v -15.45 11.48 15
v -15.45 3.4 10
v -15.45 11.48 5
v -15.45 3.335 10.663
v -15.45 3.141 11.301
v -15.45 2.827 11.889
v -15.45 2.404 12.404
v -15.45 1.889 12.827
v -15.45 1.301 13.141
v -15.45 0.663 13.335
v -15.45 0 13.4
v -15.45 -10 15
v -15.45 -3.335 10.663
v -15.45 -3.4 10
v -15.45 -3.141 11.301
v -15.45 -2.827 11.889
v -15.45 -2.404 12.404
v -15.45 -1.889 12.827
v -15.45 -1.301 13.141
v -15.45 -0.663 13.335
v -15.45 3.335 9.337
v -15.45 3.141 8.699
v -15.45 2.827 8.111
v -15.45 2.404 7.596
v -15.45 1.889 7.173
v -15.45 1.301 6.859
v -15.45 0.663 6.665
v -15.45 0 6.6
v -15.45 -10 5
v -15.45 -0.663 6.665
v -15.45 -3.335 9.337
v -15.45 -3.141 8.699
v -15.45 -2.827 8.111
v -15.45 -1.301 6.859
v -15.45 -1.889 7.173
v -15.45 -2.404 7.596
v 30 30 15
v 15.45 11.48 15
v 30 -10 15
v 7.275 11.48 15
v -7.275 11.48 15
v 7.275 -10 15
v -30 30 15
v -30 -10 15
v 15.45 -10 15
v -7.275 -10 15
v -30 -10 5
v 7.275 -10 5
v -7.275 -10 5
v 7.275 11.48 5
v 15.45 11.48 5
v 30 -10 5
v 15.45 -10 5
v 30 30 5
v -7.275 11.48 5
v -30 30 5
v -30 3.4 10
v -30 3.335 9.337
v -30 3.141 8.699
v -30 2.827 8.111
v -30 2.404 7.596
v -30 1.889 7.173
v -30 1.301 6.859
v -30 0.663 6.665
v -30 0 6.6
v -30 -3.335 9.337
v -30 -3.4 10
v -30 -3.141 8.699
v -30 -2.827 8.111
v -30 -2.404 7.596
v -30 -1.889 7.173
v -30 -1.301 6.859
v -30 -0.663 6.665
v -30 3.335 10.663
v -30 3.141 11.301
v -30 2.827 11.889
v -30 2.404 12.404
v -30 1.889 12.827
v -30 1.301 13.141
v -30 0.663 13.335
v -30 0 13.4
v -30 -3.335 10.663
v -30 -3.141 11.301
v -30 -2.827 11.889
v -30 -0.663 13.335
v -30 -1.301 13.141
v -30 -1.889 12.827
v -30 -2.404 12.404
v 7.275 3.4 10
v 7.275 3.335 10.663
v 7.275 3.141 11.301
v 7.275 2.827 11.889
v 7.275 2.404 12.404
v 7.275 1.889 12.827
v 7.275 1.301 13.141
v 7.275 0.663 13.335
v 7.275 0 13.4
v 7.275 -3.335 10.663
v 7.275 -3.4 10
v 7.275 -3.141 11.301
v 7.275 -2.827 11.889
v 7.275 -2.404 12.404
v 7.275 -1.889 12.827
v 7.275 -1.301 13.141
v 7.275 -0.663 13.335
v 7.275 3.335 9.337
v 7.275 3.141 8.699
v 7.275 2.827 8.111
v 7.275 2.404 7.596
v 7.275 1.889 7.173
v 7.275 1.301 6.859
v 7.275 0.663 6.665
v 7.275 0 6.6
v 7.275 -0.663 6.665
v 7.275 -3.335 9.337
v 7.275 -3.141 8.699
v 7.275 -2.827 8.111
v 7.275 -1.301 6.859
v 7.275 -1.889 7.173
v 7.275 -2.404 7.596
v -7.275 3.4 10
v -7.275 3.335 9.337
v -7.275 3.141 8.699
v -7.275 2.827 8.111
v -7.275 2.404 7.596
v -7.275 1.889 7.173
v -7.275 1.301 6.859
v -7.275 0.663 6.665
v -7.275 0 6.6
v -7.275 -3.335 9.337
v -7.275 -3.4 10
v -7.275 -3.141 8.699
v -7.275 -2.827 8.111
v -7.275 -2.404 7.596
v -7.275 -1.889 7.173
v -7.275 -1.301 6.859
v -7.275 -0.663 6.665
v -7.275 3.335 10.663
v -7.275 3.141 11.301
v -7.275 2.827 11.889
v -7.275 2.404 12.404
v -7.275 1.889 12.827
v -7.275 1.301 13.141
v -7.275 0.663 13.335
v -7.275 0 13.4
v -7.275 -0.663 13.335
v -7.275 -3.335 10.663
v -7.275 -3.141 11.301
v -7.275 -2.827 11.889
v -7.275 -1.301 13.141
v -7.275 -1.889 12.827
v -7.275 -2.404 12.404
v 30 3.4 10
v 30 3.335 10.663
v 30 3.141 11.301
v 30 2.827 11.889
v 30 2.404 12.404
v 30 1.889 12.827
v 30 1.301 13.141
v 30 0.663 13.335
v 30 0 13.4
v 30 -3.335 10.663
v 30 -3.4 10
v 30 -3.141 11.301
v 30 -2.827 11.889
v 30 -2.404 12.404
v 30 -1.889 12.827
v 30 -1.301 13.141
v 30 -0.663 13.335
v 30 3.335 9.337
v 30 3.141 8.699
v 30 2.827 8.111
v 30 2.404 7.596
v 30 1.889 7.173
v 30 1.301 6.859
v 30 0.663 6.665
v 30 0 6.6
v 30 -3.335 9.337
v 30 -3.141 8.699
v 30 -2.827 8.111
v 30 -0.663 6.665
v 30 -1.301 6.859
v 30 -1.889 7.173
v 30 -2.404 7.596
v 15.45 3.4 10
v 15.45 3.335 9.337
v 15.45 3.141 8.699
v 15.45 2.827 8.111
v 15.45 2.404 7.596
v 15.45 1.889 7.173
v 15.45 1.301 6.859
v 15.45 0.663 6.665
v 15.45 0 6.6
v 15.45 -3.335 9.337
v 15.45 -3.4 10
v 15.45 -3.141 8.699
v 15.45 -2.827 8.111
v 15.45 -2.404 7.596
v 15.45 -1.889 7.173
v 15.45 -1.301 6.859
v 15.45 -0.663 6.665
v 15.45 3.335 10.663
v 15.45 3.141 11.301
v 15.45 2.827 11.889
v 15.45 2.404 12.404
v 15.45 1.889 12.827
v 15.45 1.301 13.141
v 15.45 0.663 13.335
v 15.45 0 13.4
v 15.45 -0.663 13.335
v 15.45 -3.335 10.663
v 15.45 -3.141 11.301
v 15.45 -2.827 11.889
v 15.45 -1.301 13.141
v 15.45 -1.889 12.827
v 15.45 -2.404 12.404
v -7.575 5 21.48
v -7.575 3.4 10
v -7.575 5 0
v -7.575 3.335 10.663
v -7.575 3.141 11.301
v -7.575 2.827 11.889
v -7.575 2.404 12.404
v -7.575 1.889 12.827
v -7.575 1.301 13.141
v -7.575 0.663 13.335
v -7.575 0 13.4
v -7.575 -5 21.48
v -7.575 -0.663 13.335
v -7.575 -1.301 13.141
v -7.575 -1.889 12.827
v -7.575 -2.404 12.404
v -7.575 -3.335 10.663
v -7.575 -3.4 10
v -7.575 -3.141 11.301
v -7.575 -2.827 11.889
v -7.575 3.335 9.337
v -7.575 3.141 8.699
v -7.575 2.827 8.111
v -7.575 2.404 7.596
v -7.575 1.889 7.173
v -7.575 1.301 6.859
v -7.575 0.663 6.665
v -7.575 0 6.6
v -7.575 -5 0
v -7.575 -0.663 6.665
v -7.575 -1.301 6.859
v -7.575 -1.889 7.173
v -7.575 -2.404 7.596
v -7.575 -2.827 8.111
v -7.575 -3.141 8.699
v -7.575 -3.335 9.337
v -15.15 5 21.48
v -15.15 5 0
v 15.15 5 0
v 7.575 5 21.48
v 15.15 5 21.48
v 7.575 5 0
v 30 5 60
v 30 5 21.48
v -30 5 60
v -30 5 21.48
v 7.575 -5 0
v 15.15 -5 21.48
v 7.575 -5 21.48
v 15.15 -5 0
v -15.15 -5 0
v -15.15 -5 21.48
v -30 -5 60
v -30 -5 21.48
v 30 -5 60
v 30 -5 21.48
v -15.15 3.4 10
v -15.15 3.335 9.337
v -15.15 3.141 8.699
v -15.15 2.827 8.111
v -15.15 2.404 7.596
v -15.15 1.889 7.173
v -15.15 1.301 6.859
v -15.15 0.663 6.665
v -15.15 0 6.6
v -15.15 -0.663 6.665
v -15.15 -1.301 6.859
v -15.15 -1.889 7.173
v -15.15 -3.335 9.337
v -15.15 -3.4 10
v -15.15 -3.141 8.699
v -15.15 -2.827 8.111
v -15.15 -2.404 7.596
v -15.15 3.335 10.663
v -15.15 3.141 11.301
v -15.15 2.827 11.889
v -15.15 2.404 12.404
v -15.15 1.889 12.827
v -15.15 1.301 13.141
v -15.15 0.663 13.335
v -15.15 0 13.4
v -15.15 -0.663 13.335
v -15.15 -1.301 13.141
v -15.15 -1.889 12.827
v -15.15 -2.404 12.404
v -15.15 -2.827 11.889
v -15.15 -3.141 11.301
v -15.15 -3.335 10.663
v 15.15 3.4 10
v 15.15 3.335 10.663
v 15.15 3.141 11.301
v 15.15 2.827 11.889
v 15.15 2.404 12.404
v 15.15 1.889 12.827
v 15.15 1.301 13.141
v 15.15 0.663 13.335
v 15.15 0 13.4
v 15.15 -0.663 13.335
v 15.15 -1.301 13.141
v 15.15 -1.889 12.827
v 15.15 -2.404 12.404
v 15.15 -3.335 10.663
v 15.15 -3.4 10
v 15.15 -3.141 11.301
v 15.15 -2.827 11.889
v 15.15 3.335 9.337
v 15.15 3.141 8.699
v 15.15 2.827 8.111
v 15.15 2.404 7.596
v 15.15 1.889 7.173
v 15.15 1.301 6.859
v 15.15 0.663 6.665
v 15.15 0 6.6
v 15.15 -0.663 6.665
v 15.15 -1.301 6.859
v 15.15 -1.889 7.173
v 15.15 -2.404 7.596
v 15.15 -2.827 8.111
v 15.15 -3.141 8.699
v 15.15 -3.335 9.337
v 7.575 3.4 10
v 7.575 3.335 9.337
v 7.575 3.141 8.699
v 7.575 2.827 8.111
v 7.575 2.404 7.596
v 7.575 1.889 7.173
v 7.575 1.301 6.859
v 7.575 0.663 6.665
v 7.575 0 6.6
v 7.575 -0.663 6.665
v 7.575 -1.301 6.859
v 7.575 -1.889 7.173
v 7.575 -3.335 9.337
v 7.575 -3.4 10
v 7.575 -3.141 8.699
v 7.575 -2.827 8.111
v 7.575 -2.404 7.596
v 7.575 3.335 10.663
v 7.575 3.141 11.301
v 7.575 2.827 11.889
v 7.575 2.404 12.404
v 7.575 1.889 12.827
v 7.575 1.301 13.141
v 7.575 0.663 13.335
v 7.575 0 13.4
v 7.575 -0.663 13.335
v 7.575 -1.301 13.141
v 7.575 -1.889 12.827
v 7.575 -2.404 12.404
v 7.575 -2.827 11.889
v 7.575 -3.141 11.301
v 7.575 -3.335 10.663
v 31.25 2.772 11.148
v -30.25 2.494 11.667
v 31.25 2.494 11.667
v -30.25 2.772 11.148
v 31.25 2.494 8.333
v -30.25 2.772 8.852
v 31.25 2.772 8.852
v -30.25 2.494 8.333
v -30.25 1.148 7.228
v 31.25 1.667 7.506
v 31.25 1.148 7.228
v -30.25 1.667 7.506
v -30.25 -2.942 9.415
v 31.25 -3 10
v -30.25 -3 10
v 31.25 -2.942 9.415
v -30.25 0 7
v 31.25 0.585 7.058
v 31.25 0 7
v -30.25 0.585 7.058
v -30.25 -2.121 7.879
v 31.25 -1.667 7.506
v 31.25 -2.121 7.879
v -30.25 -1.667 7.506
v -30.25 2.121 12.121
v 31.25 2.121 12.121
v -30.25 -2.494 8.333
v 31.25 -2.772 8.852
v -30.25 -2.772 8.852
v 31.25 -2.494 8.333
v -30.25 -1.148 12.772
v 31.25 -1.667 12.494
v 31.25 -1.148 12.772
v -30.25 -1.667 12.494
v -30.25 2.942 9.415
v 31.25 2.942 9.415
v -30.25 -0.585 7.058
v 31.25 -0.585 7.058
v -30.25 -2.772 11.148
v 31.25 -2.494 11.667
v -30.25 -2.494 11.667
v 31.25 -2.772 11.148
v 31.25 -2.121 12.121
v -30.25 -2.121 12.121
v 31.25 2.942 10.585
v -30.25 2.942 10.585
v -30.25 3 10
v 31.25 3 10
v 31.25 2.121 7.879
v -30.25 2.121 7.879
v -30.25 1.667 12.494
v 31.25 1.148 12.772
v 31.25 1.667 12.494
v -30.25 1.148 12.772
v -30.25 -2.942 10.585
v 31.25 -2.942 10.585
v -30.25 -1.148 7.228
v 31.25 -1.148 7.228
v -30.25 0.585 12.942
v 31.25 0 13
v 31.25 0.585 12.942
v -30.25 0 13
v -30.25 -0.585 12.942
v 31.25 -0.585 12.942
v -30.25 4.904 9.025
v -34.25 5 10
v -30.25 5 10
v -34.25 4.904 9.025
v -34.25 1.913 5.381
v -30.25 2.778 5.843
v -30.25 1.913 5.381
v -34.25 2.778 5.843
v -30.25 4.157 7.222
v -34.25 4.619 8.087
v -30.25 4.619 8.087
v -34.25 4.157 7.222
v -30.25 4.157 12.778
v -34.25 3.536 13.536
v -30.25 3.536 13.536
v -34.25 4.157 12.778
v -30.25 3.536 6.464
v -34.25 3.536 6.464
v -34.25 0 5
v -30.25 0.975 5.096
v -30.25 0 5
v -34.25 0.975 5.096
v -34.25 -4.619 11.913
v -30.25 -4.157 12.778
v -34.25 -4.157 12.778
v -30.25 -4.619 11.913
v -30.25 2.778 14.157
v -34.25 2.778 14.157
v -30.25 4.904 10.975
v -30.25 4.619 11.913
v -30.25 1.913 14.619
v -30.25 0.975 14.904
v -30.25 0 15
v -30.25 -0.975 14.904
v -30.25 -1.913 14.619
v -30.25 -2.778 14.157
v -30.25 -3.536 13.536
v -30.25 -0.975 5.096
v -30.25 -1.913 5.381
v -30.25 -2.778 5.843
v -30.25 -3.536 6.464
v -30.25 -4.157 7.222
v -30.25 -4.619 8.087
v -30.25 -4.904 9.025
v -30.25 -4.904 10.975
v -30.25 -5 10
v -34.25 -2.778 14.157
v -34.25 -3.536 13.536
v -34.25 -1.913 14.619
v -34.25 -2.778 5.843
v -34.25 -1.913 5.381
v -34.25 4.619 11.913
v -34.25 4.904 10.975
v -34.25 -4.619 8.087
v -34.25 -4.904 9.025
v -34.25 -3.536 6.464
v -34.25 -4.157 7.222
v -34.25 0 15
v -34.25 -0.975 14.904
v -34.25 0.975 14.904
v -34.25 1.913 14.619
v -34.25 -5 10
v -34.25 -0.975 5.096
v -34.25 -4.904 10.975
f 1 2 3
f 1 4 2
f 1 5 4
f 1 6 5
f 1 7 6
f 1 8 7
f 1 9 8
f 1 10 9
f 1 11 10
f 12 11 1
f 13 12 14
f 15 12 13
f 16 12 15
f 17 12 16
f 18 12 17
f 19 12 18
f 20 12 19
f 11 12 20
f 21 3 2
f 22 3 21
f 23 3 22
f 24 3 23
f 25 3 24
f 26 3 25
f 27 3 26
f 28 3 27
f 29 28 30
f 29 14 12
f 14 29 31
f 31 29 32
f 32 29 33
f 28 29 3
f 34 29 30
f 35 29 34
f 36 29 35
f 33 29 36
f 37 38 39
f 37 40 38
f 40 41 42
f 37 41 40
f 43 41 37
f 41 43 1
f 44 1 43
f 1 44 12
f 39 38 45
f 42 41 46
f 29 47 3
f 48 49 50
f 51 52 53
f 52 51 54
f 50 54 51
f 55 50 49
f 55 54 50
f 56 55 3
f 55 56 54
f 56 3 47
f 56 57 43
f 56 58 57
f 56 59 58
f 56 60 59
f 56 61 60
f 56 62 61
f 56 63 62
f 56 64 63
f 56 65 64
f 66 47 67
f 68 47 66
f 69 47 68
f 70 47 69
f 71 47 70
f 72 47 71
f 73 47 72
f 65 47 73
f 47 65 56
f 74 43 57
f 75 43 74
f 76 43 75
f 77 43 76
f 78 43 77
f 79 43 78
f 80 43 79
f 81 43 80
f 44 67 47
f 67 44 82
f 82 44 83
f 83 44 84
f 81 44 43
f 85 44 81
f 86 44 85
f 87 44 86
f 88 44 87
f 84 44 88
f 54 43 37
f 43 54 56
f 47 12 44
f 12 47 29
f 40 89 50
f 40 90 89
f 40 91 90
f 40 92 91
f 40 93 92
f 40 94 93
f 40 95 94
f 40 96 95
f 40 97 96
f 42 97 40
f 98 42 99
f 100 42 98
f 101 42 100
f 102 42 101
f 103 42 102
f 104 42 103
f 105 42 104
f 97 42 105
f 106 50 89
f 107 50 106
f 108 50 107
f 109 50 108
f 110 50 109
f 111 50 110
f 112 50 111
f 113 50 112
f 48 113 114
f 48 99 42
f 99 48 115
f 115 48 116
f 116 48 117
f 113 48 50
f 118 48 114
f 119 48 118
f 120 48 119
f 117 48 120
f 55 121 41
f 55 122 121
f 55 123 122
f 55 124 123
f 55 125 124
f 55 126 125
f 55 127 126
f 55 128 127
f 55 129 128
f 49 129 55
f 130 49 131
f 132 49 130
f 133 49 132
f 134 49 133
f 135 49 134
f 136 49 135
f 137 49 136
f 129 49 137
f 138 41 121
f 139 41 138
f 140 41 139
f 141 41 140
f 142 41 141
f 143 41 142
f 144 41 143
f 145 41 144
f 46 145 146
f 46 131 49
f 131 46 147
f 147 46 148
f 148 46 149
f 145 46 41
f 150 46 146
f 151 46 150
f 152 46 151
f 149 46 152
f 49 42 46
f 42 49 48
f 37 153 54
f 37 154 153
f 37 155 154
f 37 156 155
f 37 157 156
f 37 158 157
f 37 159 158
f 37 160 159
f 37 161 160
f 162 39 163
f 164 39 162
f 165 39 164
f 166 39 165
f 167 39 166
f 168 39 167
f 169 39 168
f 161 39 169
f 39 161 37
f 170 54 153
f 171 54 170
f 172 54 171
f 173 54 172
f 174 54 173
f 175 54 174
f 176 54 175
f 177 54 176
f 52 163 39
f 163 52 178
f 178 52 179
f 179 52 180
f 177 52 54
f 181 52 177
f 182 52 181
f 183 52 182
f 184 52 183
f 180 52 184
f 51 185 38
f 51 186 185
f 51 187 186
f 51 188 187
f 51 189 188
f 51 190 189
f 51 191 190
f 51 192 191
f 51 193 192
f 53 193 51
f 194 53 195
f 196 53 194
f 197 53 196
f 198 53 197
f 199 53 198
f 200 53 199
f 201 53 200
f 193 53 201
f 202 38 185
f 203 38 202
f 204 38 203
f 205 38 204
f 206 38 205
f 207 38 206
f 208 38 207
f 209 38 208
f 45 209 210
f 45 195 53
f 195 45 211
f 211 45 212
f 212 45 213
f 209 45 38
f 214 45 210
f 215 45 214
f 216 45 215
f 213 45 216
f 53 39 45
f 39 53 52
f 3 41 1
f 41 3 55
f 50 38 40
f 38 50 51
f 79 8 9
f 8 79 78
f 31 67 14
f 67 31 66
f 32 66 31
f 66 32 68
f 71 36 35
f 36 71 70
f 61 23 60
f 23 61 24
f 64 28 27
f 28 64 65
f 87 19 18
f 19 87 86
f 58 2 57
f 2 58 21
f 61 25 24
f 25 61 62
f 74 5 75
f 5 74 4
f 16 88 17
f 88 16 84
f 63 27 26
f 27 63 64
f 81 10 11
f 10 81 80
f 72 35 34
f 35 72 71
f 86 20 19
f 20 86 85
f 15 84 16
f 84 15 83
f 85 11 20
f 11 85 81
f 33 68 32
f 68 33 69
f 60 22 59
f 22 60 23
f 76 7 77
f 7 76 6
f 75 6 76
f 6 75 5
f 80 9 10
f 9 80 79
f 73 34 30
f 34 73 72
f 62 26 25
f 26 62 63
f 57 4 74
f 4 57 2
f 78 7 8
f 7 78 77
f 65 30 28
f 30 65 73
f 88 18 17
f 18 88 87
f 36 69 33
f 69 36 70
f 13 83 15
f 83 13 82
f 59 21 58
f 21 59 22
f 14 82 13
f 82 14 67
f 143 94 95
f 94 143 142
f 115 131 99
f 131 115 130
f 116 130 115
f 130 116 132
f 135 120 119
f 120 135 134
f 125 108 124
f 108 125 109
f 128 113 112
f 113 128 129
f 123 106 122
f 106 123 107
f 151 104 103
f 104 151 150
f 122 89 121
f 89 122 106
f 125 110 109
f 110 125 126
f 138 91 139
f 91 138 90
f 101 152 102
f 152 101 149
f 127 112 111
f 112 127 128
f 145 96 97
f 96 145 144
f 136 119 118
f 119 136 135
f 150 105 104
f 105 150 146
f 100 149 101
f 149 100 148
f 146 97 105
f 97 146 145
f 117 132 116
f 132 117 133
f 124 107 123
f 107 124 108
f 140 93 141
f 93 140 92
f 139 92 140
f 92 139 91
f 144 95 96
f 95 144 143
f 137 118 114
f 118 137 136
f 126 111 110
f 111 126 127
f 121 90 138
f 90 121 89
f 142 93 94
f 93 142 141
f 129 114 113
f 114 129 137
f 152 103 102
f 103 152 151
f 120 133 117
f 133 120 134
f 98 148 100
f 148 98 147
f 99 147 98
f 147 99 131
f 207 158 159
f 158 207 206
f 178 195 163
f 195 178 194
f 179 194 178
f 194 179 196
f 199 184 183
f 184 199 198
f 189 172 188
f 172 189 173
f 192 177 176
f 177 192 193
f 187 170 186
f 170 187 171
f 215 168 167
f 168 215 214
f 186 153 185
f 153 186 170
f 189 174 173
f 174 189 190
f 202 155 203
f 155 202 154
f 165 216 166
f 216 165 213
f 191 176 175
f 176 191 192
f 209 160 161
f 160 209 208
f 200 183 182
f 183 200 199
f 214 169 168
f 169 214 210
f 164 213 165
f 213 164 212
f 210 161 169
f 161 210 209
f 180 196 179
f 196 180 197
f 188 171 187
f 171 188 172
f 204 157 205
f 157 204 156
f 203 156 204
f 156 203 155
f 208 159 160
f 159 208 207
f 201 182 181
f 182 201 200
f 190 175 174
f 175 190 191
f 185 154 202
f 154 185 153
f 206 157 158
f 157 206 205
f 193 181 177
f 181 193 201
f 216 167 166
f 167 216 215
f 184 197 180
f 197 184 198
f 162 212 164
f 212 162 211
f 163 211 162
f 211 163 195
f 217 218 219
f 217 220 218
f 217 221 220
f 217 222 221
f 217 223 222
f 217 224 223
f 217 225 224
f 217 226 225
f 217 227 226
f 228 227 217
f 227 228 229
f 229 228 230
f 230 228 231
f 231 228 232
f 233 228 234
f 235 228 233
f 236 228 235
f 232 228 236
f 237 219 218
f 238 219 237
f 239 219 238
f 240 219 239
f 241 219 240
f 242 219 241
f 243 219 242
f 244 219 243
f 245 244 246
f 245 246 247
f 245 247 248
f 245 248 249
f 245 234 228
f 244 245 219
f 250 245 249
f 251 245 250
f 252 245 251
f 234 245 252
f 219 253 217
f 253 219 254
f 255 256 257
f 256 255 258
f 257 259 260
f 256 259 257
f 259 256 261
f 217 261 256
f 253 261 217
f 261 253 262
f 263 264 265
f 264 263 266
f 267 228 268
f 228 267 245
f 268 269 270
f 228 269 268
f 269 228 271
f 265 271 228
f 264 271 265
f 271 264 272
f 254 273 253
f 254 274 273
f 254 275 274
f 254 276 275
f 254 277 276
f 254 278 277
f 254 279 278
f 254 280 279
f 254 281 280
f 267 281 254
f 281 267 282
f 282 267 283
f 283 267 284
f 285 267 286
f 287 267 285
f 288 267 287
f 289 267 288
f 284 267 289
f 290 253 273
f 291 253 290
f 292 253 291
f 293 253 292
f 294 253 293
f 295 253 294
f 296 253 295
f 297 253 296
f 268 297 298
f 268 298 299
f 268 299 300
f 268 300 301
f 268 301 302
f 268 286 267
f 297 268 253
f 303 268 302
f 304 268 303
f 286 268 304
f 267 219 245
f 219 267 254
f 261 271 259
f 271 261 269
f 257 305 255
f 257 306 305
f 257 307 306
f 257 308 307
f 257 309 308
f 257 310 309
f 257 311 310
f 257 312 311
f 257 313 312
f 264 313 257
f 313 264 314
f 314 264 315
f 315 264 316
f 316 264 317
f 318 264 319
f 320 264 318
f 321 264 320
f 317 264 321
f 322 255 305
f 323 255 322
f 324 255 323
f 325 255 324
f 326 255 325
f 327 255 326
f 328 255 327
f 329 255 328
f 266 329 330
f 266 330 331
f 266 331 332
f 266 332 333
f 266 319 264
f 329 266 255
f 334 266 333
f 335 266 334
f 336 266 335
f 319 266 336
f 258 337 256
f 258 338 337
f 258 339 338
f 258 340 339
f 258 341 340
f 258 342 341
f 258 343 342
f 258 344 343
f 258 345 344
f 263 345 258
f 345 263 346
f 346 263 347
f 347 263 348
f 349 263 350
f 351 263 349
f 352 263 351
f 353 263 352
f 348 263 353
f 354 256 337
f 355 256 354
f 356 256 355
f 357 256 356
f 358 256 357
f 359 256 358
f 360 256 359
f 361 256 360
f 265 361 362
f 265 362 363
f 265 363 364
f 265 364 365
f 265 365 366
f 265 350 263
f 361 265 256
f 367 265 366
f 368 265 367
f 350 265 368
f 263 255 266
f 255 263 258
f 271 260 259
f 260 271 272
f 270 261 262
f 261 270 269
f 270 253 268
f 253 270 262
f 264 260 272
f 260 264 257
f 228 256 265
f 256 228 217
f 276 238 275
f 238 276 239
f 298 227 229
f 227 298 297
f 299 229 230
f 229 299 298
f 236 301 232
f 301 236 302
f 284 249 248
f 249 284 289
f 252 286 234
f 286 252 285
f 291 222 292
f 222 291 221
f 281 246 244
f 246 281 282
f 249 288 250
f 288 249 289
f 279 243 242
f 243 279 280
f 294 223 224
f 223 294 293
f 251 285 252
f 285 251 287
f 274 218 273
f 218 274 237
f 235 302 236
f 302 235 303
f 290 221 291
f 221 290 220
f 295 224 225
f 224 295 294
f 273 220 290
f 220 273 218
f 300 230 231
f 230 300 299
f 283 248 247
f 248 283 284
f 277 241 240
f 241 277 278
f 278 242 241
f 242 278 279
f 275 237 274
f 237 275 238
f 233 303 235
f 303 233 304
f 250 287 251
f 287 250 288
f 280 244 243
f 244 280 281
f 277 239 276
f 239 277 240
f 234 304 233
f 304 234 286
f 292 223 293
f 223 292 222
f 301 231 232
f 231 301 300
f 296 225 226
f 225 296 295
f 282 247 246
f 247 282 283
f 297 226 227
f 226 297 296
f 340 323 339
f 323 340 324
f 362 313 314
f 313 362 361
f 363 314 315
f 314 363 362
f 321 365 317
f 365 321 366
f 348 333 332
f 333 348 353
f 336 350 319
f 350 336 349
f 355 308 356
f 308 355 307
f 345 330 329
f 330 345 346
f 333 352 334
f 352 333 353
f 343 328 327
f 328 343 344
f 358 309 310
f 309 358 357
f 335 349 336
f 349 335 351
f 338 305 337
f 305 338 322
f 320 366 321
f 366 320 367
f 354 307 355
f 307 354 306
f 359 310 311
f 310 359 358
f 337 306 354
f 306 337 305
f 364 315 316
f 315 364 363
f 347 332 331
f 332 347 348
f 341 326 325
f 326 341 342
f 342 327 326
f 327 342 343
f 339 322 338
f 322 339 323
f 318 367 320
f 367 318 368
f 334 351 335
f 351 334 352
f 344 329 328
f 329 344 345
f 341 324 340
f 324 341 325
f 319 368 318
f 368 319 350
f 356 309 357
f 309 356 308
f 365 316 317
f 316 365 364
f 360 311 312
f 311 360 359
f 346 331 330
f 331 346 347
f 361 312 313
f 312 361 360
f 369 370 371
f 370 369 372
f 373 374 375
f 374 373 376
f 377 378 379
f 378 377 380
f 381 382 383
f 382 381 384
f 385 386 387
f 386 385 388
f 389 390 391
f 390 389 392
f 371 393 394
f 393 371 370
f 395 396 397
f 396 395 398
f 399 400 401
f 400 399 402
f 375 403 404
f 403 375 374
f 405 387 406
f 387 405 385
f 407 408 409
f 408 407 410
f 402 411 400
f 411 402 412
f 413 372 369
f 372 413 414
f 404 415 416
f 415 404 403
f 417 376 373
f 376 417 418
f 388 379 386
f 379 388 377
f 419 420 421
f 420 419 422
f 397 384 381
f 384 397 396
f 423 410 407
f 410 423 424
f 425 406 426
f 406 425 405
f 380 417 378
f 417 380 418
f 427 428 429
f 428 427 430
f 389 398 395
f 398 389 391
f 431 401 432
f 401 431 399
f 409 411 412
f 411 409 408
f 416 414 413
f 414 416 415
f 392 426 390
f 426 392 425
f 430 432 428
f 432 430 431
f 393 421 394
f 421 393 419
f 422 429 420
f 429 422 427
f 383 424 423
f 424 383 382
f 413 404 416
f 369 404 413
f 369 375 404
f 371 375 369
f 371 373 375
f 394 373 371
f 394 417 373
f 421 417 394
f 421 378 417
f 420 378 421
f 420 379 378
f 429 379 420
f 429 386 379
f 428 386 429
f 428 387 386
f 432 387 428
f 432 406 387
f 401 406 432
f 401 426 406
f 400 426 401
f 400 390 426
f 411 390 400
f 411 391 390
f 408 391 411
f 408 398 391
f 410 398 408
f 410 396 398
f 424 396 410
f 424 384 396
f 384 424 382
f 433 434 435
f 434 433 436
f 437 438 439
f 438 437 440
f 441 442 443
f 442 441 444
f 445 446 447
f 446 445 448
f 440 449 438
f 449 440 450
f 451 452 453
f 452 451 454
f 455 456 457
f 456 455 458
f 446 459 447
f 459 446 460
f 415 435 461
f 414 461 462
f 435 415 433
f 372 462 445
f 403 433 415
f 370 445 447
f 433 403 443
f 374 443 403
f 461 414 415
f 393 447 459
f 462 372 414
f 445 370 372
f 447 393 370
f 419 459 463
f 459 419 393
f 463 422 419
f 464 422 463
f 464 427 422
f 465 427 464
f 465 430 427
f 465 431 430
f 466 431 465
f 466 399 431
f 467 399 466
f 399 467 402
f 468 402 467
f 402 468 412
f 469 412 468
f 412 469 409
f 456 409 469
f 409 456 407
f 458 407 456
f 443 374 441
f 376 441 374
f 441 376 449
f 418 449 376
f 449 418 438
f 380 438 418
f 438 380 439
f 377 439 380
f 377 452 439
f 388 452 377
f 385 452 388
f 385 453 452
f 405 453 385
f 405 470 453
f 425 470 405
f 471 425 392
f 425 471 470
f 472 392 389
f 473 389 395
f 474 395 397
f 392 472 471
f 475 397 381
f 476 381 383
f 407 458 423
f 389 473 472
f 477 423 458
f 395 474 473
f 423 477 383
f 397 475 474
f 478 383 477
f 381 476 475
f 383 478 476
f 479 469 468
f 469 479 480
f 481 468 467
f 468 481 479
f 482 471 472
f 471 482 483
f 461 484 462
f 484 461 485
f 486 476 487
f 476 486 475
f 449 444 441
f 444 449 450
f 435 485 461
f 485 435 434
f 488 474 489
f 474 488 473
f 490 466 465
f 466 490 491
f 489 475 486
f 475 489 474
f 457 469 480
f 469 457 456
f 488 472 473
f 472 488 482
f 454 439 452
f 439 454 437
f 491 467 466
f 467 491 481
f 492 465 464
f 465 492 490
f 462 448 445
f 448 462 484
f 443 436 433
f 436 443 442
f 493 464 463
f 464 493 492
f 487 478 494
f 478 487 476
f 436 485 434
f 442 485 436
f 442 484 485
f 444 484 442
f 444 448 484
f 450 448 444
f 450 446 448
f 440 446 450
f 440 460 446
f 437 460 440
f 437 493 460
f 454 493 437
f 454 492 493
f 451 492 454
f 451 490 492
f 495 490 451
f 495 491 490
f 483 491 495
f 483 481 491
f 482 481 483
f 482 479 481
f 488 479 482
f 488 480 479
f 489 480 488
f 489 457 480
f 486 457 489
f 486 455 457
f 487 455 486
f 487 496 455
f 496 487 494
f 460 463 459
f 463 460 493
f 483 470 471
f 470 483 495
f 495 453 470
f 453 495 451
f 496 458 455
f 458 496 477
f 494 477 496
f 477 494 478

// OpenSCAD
$fn = 32;

// ------------------------------------------------------------------------
// Butt hinge: hinge 60 mm, leaf swung 270 deg
// Every part is its own module, assembly() places every instance.
// ------------------------------------------------------------------------

// --- part 1 ---
module hinge_base() {
  difference() {
    union() {
      translate([-30, -10, -5]) cube([14.55, 40, 10]);
      translate([-7.275, -10, -5]) cube([14.55, 40, 10]);
      translate([15.45, -10, -5]) cube([14.55, 40, 10]);
      translate([-30, 11.48, -5]) cube([60, 18.52, 10]);
    }
    translate([-22.725, 0, 0]) rotate([0, 90, 0]) cylinder(h = 16.55, d = 6.8, center = true);
    translate([0, 0, 0]) rotate([0, 90, 0]) cylinder(h = 16.55, d = 6.8, center = true);
    translate([22.725, 0, 0]) rotate([0, 90, 0]) cylinder(h = 16.55, d = 6.8, center = true);
  }
}

// --- part 2 ---
module hinge_mover() {
  difference() {
    union() {
      translate([-15.15, -50, -5]) cube([7.575, 60, 10]);
      translate([7.575, -50, -5]) cube([7.575, 60, 10]);
      translate([-30, -50, -5]) cube([60, 38.52, 10]);
    }
    translate([-11.362, 0, 0]) rotate([0, 90, 0]) cylinder(h = 9.575, d = 6.8, center = true);
    translate([11.362, 0, 0]) rotate([0, 90, 0]) cylinder(h = 9.575, d = 6.8, center = true);
  }
}

// --- part 3 ---
module hinge_pin() {
  rotate([0, 90, 0]) cylinder(h = 62.5, d = 6, center = true);
  translate([-34.25, 0, 0]) rotate([0, 90, 0]) cylinder(h = 4, d = 10);
}

// --- assembly ---
module assembly() {
  color([0.80, 0.24, 0.20]) translate([0, 0, 10]) rotate([0, 0, 0]) hinge_base();
  color([0.20, 0.45, 0.75]) translate([0, 0, 10]) rotate([270, 0, 0]) hinge_mover();
  color([0.25, 0.62, 0.32]) translate([0, 0, 10]) rotate([0, 0, 0]) hinge_pin();
}

assembly();
